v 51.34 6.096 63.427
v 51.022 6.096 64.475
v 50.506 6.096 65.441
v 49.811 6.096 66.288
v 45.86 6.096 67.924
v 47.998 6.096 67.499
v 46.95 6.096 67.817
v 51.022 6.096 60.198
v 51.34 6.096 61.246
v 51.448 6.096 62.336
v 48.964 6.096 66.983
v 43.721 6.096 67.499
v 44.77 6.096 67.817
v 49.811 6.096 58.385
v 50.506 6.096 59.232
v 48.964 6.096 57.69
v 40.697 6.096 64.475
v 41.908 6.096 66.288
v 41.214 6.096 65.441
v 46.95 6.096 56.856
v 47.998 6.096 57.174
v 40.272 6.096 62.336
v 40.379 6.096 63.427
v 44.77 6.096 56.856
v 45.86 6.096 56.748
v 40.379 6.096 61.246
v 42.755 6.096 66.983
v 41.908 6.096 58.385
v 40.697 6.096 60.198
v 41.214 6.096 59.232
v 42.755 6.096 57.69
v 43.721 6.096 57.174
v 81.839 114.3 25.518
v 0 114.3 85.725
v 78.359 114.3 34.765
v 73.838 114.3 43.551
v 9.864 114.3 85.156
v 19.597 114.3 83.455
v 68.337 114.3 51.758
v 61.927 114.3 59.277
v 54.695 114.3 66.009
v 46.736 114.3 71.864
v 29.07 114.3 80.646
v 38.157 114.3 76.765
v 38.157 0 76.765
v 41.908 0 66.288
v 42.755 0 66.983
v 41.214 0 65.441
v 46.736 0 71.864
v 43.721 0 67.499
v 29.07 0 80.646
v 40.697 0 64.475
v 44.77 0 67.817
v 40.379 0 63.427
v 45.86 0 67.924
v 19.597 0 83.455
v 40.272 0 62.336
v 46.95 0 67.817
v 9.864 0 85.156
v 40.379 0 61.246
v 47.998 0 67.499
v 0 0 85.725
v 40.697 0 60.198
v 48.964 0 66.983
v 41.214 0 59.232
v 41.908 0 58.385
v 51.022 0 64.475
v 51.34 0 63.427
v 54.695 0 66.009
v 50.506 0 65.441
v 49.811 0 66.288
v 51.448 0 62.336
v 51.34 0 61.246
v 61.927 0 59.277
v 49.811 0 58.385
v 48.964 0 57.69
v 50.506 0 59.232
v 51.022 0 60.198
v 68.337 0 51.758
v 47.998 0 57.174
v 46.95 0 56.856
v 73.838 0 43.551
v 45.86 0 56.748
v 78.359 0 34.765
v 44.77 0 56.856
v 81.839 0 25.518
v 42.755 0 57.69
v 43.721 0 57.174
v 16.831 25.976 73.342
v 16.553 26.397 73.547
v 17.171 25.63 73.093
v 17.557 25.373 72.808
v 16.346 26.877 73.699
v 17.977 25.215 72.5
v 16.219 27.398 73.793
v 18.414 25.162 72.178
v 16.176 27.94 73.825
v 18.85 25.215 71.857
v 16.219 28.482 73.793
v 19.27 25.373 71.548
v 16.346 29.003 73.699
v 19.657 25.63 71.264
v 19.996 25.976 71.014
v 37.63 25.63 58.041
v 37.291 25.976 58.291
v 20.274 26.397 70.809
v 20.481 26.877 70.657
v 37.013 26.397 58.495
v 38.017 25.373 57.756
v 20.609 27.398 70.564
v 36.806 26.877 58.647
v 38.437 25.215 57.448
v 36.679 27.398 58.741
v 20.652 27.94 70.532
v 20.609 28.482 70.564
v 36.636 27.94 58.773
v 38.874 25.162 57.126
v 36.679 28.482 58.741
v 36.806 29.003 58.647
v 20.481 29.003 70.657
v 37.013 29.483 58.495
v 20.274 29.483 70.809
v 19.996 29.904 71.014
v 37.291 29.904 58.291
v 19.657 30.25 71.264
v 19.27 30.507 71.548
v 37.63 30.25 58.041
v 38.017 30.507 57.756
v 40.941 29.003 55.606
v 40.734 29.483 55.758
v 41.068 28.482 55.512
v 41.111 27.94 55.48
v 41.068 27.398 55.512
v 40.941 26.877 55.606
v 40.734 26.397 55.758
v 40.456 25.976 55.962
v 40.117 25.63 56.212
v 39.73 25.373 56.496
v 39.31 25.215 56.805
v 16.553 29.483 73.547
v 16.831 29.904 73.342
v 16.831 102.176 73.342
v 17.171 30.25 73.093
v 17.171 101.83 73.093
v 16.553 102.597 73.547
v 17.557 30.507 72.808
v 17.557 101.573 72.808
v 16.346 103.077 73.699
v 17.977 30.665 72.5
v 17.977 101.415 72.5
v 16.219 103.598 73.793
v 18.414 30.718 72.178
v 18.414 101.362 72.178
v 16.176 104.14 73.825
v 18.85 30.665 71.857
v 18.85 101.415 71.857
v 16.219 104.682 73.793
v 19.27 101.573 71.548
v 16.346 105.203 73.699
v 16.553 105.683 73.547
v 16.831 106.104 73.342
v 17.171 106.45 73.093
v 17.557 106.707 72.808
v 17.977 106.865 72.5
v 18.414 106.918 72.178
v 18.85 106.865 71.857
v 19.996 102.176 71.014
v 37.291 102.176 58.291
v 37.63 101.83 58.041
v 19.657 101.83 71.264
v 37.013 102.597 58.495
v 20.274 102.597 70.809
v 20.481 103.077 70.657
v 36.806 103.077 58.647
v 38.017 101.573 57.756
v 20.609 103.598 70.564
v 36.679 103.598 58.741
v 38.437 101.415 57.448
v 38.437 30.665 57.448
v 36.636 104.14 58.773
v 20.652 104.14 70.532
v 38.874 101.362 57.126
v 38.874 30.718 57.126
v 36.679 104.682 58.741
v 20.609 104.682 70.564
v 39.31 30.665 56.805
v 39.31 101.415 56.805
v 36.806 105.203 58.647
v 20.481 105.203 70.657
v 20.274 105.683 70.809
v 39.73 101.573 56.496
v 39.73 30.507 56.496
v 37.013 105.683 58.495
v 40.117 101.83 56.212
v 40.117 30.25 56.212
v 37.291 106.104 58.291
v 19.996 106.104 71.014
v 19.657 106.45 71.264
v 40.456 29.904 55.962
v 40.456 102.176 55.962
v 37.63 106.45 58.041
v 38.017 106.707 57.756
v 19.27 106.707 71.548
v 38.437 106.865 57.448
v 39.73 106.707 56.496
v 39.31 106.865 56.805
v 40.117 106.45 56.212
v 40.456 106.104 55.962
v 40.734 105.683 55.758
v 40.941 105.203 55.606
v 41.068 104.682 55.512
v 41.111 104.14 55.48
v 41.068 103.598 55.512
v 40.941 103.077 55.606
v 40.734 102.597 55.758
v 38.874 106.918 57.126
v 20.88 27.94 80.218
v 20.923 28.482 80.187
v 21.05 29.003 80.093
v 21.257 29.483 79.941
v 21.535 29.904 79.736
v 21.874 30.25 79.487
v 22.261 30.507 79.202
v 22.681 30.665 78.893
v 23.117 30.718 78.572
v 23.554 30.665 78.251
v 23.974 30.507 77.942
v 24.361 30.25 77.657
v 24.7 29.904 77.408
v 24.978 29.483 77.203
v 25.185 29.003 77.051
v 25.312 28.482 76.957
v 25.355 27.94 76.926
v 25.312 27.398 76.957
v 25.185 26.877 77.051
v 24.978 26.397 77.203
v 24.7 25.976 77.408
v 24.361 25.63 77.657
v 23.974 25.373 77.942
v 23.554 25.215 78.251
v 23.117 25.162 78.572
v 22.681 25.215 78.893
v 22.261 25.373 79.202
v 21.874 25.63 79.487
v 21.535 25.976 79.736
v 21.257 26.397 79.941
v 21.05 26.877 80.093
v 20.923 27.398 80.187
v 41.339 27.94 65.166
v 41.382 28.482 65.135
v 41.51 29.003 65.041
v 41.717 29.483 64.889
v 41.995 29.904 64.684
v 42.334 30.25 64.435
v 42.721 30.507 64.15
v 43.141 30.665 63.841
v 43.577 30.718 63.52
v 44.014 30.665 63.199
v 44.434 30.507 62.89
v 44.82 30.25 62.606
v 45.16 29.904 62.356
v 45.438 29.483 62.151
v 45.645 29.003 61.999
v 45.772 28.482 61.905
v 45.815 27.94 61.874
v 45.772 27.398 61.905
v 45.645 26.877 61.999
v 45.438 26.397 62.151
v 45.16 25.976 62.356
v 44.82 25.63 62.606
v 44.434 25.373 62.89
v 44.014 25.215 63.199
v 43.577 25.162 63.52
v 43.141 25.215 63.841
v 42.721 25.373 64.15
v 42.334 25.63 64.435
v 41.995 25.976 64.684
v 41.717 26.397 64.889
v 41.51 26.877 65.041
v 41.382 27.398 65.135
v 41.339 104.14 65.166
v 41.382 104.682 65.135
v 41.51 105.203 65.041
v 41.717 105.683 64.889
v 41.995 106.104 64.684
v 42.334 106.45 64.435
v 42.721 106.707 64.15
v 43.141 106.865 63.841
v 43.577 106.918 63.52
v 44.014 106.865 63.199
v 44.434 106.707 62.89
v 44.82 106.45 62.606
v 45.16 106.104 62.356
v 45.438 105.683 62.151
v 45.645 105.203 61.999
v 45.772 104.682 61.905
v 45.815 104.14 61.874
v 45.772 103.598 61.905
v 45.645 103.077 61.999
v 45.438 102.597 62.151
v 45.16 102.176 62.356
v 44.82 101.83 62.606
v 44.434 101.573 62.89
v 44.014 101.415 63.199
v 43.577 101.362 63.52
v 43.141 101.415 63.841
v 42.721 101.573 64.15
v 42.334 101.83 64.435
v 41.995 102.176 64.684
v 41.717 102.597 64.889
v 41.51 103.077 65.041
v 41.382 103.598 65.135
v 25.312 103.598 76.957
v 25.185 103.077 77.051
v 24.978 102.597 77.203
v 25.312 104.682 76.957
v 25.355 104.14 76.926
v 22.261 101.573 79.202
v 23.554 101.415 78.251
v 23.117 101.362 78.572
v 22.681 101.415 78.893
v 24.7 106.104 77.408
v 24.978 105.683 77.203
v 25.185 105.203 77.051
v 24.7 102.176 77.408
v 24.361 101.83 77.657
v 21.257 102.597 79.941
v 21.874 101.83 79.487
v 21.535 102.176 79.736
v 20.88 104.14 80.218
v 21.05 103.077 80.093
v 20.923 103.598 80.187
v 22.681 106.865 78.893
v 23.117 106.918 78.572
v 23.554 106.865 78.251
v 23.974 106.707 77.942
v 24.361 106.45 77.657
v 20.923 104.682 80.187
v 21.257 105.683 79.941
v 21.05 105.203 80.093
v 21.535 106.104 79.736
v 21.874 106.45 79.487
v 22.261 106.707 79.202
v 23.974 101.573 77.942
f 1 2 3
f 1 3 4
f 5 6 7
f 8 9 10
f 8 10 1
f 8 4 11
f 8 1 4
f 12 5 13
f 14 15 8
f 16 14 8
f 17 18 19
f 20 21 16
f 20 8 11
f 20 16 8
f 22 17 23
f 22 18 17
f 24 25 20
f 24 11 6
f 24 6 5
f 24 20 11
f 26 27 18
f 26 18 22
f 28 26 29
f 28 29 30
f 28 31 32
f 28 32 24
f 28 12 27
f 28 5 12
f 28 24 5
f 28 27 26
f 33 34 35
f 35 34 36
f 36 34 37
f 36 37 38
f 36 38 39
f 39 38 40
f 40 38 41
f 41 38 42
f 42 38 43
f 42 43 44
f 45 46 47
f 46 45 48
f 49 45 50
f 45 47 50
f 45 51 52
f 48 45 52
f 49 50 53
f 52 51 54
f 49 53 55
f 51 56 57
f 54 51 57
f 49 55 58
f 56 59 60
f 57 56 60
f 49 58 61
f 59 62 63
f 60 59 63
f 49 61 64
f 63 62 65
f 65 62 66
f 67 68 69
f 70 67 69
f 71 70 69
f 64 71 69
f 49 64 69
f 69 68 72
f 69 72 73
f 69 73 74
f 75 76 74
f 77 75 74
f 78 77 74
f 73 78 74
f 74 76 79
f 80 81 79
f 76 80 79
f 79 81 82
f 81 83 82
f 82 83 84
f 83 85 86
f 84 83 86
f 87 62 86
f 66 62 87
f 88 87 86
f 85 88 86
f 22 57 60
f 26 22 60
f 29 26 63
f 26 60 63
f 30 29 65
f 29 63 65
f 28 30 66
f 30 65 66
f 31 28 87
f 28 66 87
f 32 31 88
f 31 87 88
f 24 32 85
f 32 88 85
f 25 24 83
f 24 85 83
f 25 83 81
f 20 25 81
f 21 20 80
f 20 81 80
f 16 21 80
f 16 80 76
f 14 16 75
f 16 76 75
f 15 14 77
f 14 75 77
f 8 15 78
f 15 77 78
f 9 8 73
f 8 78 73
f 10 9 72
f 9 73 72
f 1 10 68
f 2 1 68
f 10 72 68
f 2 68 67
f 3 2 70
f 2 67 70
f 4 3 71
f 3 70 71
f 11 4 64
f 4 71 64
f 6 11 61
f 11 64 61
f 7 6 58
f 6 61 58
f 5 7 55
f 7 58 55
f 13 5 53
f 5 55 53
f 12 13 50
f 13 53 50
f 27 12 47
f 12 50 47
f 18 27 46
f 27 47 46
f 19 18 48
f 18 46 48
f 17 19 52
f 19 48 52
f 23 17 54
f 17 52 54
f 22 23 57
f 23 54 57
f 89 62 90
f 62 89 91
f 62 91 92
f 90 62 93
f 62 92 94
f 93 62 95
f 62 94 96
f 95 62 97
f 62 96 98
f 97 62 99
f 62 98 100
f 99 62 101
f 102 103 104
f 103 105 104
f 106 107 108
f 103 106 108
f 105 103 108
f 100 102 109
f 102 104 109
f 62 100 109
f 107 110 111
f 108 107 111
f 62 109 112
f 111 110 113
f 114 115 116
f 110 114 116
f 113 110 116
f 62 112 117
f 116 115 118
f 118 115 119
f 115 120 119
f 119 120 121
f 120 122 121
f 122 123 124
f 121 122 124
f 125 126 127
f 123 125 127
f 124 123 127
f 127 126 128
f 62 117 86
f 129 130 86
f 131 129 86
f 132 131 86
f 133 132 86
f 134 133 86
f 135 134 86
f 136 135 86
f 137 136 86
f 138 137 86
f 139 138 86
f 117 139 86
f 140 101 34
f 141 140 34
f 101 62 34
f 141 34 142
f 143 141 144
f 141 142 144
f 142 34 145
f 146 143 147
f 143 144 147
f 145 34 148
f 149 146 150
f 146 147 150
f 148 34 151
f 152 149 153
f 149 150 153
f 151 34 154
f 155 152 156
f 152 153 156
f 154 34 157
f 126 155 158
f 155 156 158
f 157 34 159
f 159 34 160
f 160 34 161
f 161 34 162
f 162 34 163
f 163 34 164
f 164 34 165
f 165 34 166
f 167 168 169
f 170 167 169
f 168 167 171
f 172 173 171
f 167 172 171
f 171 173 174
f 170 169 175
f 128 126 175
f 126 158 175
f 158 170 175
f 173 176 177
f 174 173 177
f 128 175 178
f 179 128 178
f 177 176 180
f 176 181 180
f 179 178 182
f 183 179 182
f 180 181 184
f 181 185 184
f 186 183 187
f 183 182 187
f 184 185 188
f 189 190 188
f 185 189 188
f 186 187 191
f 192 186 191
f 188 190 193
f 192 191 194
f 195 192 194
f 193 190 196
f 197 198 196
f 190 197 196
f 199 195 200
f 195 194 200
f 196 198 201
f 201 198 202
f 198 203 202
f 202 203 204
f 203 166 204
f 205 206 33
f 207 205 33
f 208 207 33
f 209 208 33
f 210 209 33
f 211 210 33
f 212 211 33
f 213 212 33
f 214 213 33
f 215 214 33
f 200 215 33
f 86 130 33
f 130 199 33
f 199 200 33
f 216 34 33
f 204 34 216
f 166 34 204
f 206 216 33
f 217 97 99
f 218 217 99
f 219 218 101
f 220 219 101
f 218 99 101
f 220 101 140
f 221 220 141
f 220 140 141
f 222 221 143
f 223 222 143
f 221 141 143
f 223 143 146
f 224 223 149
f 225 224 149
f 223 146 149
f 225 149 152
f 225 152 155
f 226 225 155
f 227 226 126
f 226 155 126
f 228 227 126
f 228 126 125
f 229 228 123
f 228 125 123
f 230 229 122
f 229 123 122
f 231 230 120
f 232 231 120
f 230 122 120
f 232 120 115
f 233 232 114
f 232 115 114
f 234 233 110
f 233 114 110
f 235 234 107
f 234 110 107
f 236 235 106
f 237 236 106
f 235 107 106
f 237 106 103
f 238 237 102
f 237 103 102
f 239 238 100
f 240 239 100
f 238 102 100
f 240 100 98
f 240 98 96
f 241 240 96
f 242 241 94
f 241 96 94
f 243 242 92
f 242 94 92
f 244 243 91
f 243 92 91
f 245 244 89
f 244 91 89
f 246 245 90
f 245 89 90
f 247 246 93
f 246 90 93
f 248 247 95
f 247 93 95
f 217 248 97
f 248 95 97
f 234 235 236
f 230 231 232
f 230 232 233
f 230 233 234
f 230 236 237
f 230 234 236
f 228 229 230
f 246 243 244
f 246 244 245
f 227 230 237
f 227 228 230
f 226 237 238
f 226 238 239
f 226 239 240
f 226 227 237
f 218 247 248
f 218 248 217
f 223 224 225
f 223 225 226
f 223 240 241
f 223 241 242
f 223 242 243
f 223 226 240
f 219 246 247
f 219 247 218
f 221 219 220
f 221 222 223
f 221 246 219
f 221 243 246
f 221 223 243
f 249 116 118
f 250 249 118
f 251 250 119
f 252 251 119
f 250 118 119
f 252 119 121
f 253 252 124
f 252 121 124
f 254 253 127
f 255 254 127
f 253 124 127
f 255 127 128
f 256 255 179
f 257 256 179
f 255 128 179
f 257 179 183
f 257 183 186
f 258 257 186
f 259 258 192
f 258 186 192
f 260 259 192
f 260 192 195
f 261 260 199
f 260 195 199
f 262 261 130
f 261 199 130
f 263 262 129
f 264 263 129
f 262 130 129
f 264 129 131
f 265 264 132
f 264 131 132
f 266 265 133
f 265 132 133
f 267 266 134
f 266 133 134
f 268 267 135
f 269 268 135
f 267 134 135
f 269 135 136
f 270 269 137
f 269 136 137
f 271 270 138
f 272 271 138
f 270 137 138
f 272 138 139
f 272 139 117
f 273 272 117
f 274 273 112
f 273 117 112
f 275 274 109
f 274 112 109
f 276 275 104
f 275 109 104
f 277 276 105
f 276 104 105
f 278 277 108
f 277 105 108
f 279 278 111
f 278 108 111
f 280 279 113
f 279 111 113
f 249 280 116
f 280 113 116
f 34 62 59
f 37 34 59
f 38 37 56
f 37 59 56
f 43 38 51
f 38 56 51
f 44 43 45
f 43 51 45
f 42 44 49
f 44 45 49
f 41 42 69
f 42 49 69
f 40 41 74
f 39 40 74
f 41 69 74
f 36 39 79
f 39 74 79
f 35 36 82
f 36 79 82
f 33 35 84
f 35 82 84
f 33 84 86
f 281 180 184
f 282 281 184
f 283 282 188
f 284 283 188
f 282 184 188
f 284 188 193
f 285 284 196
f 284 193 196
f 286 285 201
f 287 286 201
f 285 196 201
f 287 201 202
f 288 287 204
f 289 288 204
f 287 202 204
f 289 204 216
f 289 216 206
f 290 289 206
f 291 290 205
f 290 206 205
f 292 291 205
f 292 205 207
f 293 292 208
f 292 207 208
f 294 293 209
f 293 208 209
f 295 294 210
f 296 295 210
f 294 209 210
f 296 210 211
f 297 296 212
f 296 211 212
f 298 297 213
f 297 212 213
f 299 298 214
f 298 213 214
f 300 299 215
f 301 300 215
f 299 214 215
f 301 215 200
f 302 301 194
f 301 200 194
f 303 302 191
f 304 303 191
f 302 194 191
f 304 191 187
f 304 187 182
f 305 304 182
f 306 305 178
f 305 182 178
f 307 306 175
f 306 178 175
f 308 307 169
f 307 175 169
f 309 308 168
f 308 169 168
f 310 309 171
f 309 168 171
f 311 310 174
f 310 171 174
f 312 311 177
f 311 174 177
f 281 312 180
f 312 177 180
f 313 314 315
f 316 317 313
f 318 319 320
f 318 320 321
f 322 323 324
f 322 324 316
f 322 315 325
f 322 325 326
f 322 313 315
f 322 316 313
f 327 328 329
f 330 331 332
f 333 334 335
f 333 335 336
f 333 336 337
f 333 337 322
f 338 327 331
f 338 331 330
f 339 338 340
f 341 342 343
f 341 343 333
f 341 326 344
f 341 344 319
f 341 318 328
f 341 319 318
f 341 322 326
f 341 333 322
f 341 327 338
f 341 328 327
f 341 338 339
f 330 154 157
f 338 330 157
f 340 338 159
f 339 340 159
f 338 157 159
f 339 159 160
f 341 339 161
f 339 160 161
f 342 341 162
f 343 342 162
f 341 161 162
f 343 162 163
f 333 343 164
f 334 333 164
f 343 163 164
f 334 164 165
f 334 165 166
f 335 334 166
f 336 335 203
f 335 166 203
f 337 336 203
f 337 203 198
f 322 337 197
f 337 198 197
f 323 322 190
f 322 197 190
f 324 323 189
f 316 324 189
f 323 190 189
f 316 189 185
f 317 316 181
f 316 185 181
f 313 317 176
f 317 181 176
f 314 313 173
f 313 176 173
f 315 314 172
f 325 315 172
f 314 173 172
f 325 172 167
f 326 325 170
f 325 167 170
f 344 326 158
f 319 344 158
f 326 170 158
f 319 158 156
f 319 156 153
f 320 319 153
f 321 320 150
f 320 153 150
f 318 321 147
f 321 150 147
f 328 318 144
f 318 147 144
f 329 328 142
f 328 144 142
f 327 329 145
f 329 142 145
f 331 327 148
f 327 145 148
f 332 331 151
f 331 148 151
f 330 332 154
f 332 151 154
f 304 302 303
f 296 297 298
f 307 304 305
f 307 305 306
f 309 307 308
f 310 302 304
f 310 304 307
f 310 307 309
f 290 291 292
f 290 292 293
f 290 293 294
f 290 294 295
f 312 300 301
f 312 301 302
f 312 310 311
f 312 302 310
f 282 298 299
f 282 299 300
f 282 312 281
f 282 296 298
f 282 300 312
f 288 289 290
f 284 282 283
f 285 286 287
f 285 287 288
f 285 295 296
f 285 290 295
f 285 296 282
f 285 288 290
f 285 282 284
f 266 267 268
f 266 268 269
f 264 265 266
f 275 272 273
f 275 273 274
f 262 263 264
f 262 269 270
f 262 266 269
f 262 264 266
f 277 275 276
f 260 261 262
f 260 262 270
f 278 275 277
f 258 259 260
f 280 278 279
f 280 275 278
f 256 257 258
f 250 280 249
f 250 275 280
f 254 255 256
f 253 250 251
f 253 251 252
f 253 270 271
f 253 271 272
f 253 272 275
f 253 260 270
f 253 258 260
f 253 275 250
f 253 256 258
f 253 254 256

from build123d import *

# Parameters (mm, degrees)
SKETCH1_R           = 85.725
BOSS_EXTRUDE1_DEPTH = 114.3
CUT_EXTRUDE1_DEPTH  = 152.4
SKETCH3_R           = 2.778125
CUT_EXTRUDE2_DEPTH  = 7.9375
SKETCH4_R           = 5.588
CUT_EXTRUDE3_DEPTH  = 6.096


with BuildPart() as part:
    # Sketch1 → Boss-Extrude1 (new body)
    with BuildSketch(Plane(origin=(0, 0, 0), x_dir=(1, 0, 0), z_dir=(0, 1, 0))):
        Circle(SKETCH1_R)
    extrude(amount=BOSS_EXTRUDE1_DEPTH)

    # Sketch2 → Cut-Extrude1 (cut)
    with BuildSketch(Plane(origin=(0, 114.3, 0), x_dir=(1, 0, 0), z_dir=(0, 1, 0))):
        Polygon((0, -85.725), (81.83903771, -25.517592593), (151.304734273, 75.062868172), (-38.51393236, 115.934796391), (-149.339737724, 18.86396687), (-68.774879215, -104.537816407), align=None)
    extrude(amount=-CUT_EXTRUDE1_DEPTH, mode=Mode.SUBTRACT)

    # Sketch3 → Cut-Extrude2 (cut)
    with BuildSketch(Plane(origin=(40.919518855, 0, 55.621296296), x_dir=(-0.80550234, 0, 0.592592593), z_dir=(-0.592592593, 0, -0.80550234))):
        with Locations((2.54, 104.14)):
            Circle(SKETCH3_R)
        with Locations((27.94, 104.14)):
            Circle(SKETCH3_R)
        with Locations((2.54, 27.94)):
            Circle(SKETCH3_R)
        with Locations((27.94, 27.94)):
            Circle(SKETCH3_R)
    extrude(amount=-CUT_EXTRUDE2_DEPTH, mode=Mode.SUBTRACT)

    # Sketch4 → Cut-Extrude3 (cut)
    with BuildSketch(Plane(origin=(0, 0, 0), x_dir=(-1, 0, 0), z_dir=(0, -1, 0))):
        with Locations((-45.859759427, -62.336492182)):
            Circle(SKETCH4_R)
    extrude(amount=-CUT_EXTRUDE3_DEPTH, mode=Mode.SUBTRACT)


solid = part.part
